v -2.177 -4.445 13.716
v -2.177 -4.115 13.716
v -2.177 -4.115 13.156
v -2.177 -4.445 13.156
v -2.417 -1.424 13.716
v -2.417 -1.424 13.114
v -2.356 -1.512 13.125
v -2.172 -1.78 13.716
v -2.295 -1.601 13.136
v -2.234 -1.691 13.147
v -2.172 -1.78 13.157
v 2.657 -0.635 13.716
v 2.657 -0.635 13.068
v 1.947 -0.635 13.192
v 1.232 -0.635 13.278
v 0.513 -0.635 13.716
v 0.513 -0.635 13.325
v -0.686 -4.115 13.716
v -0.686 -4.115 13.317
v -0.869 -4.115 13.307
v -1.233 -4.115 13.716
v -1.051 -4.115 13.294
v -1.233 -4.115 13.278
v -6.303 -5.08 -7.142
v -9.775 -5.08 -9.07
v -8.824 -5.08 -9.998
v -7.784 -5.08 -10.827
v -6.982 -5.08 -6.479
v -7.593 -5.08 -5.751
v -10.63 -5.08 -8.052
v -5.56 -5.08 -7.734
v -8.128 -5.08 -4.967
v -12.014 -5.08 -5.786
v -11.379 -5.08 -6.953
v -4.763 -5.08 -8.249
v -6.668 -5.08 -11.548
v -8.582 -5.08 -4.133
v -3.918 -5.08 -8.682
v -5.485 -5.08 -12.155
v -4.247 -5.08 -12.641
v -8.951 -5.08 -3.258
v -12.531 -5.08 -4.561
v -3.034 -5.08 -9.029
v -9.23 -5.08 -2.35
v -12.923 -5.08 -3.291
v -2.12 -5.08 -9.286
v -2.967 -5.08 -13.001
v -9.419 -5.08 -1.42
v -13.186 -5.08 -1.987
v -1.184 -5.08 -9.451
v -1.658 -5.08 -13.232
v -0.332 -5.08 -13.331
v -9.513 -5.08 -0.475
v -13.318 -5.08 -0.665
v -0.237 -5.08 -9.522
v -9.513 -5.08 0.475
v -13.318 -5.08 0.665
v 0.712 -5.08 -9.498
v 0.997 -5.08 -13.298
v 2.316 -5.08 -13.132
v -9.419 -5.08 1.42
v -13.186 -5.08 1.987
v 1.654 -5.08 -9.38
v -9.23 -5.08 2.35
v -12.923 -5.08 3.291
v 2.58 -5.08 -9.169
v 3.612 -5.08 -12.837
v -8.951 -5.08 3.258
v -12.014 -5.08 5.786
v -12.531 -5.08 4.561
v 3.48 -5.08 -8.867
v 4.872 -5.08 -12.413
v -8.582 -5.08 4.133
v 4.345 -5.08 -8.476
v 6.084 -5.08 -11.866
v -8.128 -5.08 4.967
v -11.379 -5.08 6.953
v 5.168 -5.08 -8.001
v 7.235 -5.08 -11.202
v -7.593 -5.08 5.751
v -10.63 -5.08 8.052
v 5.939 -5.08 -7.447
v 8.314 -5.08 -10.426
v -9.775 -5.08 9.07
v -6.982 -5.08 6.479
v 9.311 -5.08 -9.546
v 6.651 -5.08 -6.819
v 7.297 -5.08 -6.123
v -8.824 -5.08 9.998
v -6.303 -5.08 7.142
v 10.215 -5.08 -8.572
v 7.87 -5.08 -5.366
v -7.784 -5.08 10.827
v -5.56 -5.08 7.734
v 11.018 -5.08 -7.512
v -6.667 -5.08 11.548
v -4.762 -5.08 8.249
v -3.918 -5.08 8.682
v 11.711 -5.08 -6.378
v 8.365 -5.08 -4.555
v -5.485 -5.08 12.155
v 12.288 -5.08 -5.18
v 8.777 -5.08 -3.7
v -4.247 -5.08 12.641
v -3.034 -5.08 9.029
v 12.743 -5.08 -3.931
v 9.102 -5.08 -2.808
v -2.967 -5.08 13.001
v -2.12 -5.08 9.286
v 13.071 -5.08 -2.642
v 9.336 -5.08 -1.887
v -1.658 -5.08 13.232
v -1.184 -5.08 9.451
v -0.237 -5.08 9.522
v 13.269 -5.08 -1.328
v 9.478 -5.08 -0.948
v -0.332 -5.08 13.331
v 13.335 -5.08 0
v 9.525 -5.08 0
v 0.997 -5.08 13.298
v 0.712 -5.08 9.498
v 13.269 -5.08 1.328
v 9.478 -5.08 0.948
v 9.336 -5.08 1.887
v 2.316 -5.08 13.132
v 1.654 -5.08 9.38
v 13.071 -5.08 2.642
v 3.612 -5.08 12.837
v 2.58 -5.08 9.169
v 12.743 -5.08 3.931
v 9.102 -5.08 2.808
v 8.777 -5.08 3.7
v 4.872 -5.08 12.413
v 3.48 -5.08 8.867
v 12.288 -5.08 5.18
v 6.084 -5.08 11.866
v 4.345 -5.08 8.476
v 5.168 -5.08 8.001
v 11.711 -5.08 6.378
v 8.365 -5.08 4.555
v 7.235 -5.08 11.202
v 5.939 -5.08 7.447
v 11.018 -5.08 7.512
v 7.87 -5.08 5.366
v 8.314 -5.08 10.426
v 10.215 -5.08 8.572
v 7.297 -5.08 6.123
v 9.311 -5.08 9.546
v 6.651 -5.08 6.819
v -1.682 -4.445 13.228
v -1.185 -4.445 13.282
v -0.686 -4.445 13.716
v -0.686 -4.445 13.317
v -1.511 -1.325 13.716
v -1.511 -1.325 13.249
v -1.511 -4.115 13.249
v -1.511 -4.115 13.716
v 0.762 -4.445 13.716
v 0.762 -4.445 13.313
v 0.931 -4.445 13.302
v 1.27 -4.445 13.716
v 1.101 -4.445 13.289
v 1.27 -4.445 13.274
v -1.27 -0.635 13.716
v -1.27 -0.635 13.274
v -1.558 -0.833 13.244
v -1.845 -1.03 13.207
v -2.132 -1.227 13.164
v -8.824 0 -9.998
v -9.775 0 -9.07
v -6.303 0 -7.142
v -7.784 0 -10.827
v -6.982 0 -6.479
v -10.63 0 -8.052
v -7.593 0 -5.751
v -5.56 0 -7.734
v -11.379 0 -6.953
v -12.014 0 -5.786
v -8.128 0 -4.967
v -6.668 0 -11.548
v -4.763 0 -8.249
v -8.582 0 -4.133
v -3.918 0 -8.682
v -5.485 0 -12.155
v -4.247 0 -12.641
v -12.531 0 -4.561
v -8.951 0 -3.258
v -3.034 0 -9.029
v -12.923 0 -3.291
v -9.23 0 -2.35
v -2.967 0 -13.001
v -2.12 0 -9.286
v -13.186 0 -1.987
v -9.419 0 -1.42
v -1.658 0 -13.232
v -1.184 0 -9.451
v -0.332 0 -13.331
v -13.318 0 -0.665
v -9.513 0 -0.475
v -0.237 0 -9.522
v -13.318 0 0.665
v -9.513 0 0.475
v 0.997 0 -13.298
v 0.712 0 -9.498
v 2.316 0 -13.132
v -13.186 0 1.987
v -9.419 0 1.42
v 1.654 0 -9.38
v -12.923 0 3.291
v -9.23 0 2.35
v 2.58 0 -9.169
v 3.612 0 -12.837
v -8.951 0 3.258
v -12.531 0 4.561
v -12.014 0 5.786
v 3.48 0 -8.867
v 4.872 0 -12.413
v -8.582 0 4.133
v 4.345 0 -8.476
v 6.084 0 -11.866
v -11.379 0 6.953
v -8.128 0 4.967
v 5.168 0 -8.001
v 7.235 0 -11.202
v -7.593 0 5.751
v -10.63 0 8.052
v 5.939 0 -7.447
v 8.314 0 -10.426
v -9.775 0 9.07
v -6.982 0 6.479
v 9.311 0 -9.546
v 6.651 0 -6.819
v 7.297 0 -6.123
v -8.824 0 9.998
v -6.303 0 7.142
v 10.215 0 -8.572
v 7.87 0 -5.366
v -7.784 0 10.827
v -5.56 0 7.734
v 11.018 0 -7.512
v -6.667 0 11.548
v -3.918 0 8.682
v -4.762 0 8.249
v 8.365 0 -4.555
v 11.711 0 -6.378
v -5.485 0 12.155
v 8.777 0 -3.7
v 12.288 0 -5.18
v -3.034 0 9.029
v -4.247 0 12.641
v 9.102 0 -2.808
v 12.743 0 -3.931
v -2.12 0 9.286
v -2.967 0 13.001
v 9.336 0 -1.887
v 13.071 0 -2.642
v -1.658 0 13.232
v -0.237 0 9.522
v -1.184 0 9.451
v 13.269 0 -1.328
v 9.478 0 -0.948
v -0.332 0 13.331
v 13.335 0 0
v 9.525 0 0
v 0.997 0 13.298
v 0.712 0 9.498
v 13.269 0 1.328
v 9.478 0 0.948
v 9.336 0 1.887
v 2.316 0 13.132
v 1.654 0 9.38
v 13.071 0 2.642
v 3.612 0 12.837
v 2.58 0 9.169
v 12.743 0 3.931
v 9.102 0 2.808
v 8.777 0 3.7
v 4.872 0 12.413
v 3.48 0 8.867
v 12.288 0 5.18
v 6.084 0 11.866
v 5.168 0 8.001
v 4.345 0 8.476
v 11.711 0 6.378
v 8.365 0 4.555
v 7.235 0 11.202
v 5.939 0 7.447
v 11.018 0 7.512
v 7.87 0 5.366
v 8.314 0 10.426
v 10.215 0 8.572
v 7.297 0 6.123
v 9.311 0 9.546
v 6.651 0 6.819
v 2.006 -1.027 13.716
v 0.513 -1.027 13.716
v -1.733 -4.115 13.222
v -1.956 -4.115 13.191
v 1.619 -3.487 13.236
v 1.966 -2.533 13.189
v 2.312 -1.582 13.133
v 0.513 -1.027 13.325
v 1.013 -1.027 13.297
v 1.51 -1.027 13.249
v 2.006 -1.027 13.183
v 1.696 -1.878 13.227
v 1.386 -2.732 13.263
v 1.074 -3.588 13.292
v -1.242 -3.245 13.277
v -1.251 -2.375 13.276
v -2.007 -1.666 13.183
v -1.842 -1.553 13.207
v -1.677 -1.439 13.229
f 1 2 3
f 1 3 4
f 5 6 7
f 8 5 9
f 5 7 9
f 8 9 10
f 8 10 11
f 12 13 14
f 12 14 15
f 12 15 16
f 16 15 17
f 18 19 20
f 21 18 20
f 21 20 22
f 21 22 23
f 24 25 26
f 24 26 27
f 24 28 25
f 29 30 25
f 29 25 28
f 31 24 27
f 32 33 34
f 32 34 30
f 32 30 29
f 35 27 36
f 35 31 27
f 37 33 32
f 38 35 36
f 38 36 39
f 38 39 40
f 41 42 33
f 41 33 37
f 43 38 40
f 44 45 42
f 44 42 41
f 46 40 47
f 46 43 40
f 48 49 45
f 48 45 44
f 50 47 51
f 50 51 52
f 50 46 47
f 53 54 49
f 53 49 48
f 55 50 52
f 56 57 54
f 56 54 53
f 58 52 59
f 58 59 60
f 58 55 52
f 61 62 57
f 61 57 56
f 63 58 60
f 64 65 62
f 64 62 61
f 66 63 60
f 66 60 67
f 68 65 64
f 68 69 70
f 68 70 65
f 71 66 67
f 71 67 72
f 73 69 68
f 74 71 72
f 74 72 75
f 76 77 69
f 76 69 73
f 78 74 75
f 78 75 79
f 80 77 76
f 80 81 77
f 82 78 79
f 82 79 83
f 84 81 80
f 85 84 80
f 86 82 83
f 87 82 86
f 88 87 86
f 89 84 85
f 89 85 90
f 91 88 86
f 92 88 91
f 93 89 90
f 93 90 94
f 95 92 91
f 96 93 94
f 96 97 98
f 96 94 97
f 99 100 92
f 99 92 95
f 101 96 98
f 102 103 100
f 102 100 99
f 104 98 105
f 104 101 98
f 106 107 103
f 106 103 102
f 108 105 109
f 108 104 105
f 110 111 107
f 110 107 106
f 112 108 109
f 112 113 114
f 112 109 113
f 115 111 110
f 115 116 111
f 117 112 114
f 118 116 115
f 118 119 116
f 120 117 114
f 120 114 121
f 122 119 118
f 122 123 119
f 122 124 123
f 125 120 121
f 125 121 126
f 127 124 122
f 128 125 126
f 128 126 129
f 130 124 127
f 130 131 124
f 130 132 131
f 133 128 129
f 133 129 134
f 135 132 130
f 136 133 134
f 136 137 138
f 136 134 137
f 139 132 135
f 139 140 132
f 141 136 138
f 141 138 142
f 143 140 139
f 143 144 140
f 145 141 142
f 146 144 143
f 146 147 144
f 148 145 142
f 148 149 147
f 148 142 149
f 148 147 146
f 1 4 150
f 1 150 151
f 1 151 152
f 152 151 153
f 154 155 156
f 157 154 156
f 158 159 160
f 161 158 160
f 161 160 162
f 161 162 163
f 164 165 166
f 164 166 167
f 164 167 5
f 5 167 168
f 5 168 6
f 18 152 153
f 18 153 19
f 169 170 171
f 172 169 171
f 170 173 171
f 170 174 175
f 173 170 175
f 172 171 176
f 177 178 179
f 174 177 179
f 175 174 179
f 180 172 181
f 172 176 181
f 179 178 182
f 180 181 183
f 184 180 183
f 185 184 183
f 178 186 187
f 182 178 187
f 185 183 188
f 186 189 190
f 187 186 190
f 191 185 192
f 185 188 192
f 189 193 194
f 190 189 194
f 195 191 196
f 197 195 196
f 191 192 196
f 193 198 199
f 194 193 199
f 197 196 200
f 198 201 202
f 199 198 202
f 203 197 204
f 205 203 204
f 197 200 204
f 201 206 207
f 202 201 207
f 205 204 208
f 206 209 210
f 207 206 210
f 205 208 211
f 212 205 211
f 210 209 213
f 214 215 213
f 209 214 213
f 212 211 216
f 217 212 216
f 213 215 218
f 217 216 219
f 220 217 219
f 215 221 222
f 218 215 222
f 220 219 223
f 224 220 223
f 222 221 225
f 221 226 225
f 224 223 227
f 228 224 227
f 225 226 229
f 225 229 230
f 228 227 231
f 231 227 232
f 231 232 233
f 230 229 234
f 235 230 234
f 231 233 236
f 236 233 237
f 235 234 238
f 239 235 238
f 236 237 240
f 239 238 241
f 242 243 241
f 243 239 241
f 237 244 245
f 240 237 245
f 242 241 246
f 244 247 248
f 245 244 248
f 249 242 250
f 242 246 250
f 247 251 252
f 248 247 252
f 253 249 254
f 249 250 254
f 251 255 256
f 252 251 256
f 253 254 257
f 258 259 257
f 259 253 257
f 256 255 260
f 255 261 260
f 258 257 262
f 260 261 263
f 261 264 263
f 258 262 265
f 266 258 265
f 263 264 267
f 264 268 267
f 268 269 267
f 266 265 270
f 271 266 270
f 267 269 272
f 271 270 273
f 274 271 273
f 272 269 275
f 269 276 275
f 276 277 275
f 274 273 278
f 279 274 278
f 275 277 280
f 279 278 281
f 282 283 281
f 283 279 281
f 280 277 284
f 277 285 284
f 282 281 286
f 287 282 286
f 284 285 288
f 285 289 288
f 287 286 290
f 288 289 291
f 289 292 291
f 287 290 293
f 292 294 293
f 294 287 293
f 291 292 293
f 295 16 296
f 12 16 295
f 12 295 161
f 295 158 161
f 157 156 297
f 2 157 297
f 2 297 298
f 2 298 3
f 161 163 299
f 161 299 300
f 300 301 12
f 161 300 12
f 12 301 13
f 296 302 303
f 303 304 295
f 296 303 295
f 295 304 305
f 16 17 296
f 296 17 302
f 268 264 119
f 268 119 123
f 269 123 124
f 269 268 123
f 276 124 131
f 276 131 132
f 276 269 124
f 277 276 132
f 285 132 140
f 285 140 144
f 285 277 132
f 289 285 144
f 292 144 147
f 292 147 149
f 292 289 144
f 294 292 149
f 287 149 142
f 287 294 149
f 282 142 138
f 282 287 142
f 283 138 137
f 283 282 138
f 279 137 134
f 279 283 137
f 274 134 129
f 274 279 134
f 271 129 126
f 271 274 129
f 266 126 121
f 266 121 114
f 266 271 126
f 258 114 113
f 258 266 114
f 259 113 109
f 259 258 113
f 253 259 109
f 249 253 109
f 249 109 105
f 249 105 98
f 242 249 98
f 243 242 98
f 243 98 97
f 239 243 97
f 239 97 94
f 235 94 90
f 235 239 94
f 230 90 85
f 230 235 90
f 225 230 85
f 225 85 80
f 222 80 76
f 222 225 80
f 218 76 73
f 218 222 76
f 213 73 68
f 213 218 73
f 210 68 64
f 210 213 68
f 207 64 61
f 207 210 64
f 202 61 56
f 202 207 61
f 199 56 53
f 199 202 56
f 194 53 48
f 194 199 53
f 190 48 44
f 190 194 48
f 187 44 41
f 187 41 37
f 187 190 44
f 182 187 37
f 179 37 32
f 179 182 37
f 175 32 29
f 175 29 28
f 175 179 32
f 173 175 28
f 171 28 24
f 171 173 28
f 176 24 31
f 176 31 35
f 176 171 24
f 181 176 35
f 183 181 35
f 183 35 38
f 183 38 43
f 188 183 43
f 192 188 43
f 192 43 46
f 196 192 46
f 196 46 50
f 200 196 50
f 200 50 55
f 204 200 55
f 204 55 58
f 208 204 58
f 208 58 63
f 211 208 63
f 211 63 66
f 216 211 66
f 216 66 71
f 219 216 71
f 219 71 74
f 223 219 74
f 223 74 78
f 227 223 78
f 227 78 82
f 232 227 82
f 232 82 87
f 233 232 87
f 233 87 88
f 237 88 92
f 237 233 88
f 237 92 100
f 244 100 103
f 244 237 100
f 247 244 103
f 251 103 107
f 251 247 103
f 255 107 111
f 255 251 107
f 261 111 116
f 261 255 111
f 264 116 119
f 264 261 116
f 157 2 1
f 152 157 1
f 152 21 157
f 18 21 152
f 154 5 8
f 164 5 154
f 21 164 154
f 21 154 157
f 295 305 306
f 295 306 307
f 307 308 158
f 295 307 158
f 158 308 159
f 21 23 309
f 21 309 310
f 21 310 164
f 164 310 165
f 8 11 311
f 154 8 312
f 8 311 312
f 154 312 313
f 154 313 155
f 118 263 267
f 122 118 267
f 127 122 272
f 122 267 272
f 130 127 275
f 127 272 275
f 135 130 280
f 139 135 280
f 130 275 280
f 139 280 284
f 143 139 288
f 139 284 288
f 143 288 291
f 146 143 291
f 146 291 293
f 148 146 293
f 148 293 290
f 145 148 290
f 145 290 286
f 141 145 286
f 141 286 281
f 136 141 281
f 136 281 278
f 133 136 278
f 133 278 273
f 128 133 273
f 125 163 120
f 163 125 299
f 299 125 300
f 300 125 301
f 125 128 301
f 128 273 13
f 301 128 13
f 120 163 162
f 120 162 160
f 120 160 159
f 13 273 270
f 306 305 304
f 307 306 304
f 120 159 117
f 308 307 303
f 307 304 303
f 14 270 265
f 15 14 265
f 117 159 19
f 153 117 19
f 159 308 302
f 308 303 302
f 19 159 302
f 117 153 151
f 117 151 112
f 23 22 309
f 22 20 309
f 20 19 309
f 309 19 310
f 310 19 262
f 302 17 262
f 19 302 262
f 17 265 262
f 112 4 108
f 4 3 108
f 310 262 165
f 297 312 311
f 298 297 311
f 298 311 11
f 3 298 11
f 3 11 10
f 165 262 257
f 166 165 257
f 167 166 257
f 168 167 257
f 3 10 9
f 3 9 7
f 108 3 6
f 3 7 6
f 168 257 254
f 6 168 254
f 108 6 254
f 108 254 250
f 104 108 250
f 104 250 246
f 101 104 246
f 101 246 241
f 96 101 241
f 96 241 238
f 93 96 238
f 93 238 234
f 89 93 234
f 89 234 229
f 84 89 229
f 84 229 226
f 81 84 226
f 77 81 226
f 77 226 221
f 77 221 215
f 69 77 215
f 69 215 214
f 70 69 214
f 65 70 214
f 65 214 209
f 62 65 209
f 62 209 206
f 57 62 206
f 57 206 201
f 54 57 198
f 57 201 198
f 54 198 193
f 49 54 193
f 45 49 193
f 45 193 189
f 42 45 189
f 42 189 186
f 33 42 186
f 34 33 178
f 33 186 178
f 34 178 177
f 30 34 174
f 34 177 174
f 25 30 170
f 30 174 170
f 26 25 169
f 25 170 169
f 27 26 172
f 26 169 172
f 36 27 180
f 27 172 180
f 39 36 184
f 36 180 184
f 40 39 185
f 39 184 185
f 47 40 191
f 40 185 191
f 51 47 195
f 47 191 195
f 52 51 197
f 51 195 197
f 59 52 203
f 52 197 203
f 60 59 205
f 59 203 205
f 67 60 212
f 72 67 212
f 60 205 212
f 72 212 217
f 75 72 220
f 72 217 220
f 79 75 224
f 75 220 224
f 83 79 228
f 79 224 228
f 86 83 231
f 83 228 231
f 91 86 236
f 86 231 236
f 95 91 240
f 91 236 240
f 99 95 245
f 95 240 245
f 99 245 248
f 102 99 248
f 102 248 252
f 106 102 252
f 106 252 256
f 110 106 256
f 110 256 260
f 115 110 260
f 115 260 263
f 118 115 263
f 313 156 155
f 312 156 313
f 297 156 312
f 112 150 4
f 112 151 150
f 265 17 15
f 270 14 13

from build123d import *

# Parameters (mm, degrees)
F0_R     = 13.335
F0_R_2   = 9.525
F1_DEPTH = 5.08
F4_DEPTH = 3.556


with BuildPart() as f1:
    # F0 (on Front) → F1 (new body)
    with BuildSketch(Plane.XZ):
        Circle(F0_R)
        Circle(F0_R_2, mode=Mode.SUBTRACT)
    extrude(amount=F1_DEPTH)

    # F3 (on offset) → F4 (join)
    with BuildSketch(Plane.XY.offset(10.16)):
        Polygon((-1.232519, -4.1148), (-1.27, -0.635), (-2.417171, -1.423591), (-2.172425, -1.779626), (-1.510733, -1.324764), (-1.510733, -4.1148), (-2.177129, -4.1148), (-2.177129, -4.445), (-0.686343, -4.445), (-0.686343, -4.1148), align=None)
        Polygon((2.006021, -1.027081), (0.762, -4.445), (1.27, -4.445), (2.656727, -0.635), (0.513302, -0.635), (0.513302, -1.027081), align=None)
    extrude(amount=F4_DEPTH)


solid = f1.part
